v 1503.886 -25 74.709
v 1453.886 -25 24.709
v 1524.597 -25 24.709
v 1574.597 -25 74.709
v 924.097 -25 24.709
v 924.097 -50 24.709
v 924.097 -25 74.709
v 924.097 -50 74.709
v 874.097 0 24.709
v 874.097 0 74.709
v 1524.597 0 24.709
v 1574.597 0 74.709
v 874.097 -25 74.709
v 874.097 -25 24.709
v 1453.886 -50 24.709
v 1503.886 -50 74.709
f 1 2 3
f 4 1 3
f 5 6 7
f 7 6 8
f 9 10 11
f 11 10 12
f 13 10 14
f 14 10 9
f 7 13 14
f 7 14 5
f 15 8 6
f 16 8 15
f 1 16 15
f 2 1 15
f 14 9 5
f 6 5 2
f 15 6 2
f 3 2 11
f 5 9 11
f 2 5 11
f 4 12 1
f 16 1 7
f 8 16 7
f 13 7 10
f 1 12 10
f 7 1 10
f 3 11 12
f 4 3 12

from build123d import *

# Parameters (mm, degrees)
F1_DEPTH = 50
F3_DEPTH = 25
F4_DEPTH = 25
F5_W     = 50
F5_H     = 50
F6_DEPTH = 25


with BuildPart() as f1:
    # F0 (on Front) → F1 (new body)
    with BuildSketch(Plane.XZ):
        Polygon((874.097177, 74.70942), (874.097177, 24.70942), (1524.597177, 24.70942), (1574.597177, 74.70942), align=None)
    extrude(amount=F1_DEPTH)

    # F2 (on face) → F3 (cut)
    with BuildSketch(Plane.XZ.offset(50)):
        Polygon((1524.597177, 24.70942), (1574.597177, 74.70942), (1503.886499, 74.70942), (1453.886499, 24.70942), align=None)
    extrude(amount=-F3_DEPTH, mode=Mode.SUBTRACT)

    # F2 (on face) → F4 (cut)
    with BuildSketch(Plane.XZ.offset(50)):
        Polygon((1524.597177, 24.70942), (1574.597177, 74.70942), (1503.886499, 74.70942), (1453.886499, 24.70942), align=None)
    extrude(amount=-F4_DEPTH, mode=Mode.SUBTRACT)

    # F5 (on face) → F6 (cut)
    with BuildSketch(Plane.XZ.offset(50)):
        with Locations((899.097177, 49.70942)):
            Rectangle(F5_W, F5_H)
    extrude(amount=-F6_DEPTH, mode=Mode.SUBTRACT)


solid = f1.part
